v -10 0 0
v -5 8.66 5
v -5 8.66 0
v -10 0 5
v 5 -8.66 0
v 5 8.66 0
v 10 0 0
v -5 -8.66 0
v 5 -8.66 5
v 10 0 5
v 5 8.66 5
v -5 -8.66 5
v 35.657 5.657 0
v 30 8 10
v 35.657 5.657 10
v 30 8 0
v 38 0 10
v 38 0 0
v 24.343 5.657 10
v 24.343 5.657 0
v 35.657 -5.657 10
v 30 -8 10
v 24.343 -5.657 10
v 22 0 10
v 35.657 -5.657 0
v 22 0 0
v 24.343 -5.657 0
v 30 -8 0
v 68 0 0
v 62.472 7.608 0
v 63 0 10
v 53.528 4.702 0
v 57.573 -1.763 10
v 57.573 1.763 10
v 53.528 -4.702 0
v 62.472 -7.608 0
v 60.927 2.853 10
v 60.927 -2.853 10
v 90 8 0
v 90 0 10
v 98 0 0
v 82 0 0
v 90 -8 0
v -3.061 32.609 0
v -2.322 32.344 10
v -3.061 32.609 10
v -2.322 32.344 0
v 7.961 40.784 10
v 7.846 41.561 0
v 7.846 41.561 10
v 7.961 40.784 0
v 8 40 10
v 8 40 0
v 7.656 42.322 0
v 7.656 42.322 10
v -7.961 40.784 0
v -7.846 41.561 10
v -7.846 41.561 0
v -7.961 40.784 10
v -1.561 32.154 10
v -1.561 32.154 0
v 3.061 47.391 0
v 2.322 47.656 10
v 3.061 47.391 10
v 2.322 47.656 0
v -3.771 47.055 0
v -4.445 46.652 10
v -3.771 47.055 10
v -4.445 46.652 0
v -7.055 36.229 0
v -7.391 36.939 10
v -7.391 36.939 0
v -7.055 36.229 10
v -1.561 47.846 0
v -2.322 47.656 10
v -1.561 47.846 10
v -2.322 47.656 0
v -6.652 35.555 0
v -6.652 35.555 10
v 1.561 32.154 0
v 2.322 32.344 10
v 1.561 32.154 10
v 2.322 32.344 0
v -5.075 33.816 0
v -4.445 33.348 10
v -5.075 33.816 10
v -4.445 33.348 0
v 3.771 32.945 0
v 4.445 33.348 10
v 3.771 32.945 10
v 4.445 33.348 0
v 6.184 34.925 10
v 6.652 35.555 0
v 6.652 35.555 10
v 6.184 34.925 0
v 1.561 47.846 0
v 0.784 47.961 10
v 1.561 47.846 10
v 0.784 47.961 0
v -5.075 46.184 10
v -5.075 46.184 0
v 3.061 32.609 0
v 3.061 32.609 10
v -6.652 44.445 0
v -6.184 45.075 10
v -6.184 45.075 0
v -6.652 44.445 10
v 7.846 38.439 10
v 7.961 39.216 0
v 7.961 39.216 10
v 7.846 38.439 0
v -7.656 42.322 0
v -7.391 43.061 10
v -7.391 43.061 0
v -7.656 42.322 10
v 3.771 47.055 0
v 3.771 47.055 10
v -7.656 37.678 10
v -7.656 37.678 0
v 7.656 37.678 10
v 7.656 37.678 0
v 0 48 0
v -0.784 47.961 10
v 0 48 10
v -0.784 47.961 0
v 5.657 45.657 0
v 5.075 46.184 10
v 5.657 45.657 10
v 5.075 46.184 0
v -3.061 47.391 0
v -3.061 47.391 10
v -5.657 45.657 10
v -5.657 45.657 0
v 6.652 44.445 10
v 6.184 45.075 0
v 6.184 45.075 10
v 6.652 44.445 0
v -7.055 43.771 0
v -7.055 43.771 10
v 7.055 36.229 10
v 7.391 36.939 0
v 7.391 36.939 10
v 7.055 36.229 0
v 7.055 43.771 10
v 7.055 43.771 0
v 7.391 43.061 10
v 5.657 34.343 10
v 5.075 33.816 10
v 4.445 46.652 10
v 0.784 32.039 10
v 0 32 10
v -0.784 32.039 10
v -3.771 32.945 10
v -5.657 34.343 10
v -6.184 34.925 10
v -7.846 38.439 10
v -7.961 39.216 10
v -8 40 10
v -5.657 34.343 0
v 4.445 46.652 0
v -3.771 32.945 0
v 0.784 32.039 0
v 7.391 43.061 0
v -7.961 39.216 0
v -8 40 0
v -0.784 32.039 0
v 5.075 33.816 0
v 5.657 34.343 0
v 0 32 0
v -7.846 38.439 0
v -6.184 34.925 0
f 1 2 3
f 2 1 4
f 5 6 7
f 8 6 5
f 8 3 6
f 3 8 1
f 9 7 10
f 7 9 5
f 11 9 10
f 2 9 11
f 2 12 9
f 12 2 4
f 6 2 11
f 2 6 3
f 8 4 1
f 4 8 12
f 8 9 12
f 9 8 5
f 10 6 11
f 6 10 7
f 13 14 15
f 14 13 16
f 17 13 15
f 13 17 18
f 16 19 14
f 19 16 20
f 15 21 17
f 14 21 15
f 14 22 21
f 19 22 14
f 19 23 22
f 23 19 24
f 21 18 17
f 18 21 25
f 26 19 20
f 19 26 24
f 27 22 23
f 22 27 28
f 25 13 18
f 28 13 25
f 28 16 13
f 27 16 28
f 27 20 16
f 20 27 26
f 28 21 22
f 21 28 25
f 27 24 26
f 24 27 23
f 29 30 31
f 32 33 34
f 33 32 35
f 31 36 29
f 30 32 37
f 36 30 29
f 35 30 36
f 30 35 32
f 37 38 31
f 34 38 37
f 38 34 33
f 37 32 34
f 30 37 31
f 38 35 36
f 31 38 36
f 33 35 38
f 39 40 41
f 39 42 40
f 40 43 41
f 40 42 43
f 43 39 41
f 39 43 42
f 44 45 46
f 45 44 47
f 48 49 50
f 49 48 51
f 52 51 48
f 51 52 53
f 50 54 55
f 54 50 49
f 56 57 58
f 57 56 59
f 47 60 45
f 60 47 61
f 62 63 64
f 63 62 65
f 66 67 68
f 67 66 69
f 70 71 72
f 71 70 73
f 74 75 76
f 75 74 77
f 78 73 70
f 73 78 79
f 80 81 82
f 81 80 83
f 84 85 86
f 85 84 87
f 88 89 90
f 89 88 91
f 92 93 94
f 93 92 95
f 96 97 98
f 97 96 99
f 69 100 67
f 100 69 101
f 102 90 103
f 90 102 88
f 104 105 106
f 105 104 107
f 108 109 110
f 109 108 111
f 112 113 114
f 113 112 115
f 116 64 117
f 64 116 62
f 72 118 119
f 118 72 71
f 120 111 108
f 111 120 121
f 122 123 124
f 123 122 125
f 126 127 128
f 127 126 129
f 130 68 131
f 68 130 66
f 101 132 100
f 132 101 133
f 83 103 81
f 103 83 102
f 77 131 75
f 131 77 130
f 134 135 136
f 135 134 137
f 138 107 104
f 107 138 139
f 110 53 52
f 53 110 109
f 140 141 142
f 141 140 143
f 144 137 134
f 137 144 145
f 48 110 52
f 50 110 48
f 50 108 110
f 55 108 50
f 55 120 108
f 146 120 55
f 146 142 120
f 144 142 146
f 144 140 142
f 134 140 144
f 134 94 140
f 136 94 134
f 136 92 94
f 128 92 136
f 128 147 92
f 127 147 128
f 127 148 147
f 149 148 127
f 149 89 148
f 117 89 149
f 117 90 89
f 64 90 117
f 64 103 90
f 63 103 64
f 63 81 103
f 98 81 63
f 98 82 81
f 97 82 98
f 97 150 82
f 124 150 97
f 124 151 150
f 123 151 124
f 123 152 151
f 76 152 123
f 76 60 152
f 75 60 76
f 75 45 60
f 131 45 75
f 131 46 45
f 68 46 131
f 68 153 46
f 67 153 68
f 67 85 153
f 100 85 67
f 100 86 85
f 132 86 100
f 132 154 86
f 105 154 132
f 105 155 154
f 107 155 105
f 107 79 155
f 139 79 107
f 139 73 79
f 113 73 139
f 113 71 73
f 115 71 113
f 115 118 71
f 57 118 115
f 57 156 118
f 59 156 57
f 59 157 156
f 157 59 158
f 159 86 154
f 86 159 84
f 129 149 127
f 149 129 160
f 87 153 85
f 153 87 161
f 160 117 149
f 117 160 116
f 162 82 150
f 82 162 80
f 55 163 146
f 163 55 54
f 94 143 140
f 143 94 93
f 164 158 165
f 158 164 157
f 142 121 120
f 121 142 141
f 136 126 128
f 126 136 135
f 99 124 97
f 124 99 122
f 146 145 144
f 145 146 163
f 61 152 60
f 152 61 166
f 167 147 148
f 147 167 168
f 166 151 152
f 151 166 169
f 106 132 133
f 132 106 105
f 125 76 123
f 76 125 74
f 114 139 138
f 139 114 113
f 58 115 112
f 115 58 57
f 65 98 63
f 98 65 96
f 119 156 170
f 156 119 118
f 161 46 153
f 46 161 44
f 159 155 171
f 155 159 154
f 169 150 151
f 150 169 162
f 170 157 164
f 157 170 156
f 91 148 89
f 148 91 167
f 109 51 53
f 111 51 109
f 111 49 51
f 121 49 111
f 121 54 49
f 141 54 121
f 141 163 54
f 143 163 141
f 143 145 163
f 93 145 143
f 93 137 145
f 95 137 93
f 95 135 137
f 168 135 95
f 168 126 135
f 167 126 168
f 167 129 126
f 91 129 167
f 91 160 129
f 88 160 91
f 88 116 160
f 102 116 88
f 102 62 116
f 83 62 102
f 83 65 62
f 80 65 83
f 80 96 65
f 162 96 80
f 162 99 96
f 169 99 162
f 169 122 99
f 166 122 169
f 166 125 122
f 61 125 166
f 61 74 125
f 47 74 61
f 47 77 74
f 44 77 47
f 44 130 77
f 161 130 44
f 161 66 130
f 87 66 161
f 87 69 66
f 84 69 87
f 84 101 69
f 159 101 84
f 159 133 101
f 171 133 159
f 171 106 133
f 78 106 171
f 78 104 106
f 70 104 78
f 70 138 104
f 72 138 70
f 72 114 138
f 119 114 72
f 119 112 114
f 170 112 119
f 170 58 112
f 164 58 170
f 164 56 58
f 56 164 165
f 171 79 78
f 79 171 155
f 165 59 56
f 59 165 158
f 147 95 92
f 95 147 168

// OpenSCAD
// $fn below the threshold is intentional geometry: these are real polygons.
linear_extrude(height = 5) circle(r = 10, $fn = 6);
translate([30, 0, 0]) cylinder(h = 10, r = 8, $fn = 8);
translate([60, 0, 0]) cylinder(h = 10, r1 = 8, r2 = 3, $fn = 5);
translate([90, 0, 0]) cylinder(h = 10, r1 = 8, r2 = 0, $fn = 4);
// at or above the threshold, a complexity switch: exact curves
translate([0, 40, 0]) cylinder(h = 10, r = 8, $fn = 64);
